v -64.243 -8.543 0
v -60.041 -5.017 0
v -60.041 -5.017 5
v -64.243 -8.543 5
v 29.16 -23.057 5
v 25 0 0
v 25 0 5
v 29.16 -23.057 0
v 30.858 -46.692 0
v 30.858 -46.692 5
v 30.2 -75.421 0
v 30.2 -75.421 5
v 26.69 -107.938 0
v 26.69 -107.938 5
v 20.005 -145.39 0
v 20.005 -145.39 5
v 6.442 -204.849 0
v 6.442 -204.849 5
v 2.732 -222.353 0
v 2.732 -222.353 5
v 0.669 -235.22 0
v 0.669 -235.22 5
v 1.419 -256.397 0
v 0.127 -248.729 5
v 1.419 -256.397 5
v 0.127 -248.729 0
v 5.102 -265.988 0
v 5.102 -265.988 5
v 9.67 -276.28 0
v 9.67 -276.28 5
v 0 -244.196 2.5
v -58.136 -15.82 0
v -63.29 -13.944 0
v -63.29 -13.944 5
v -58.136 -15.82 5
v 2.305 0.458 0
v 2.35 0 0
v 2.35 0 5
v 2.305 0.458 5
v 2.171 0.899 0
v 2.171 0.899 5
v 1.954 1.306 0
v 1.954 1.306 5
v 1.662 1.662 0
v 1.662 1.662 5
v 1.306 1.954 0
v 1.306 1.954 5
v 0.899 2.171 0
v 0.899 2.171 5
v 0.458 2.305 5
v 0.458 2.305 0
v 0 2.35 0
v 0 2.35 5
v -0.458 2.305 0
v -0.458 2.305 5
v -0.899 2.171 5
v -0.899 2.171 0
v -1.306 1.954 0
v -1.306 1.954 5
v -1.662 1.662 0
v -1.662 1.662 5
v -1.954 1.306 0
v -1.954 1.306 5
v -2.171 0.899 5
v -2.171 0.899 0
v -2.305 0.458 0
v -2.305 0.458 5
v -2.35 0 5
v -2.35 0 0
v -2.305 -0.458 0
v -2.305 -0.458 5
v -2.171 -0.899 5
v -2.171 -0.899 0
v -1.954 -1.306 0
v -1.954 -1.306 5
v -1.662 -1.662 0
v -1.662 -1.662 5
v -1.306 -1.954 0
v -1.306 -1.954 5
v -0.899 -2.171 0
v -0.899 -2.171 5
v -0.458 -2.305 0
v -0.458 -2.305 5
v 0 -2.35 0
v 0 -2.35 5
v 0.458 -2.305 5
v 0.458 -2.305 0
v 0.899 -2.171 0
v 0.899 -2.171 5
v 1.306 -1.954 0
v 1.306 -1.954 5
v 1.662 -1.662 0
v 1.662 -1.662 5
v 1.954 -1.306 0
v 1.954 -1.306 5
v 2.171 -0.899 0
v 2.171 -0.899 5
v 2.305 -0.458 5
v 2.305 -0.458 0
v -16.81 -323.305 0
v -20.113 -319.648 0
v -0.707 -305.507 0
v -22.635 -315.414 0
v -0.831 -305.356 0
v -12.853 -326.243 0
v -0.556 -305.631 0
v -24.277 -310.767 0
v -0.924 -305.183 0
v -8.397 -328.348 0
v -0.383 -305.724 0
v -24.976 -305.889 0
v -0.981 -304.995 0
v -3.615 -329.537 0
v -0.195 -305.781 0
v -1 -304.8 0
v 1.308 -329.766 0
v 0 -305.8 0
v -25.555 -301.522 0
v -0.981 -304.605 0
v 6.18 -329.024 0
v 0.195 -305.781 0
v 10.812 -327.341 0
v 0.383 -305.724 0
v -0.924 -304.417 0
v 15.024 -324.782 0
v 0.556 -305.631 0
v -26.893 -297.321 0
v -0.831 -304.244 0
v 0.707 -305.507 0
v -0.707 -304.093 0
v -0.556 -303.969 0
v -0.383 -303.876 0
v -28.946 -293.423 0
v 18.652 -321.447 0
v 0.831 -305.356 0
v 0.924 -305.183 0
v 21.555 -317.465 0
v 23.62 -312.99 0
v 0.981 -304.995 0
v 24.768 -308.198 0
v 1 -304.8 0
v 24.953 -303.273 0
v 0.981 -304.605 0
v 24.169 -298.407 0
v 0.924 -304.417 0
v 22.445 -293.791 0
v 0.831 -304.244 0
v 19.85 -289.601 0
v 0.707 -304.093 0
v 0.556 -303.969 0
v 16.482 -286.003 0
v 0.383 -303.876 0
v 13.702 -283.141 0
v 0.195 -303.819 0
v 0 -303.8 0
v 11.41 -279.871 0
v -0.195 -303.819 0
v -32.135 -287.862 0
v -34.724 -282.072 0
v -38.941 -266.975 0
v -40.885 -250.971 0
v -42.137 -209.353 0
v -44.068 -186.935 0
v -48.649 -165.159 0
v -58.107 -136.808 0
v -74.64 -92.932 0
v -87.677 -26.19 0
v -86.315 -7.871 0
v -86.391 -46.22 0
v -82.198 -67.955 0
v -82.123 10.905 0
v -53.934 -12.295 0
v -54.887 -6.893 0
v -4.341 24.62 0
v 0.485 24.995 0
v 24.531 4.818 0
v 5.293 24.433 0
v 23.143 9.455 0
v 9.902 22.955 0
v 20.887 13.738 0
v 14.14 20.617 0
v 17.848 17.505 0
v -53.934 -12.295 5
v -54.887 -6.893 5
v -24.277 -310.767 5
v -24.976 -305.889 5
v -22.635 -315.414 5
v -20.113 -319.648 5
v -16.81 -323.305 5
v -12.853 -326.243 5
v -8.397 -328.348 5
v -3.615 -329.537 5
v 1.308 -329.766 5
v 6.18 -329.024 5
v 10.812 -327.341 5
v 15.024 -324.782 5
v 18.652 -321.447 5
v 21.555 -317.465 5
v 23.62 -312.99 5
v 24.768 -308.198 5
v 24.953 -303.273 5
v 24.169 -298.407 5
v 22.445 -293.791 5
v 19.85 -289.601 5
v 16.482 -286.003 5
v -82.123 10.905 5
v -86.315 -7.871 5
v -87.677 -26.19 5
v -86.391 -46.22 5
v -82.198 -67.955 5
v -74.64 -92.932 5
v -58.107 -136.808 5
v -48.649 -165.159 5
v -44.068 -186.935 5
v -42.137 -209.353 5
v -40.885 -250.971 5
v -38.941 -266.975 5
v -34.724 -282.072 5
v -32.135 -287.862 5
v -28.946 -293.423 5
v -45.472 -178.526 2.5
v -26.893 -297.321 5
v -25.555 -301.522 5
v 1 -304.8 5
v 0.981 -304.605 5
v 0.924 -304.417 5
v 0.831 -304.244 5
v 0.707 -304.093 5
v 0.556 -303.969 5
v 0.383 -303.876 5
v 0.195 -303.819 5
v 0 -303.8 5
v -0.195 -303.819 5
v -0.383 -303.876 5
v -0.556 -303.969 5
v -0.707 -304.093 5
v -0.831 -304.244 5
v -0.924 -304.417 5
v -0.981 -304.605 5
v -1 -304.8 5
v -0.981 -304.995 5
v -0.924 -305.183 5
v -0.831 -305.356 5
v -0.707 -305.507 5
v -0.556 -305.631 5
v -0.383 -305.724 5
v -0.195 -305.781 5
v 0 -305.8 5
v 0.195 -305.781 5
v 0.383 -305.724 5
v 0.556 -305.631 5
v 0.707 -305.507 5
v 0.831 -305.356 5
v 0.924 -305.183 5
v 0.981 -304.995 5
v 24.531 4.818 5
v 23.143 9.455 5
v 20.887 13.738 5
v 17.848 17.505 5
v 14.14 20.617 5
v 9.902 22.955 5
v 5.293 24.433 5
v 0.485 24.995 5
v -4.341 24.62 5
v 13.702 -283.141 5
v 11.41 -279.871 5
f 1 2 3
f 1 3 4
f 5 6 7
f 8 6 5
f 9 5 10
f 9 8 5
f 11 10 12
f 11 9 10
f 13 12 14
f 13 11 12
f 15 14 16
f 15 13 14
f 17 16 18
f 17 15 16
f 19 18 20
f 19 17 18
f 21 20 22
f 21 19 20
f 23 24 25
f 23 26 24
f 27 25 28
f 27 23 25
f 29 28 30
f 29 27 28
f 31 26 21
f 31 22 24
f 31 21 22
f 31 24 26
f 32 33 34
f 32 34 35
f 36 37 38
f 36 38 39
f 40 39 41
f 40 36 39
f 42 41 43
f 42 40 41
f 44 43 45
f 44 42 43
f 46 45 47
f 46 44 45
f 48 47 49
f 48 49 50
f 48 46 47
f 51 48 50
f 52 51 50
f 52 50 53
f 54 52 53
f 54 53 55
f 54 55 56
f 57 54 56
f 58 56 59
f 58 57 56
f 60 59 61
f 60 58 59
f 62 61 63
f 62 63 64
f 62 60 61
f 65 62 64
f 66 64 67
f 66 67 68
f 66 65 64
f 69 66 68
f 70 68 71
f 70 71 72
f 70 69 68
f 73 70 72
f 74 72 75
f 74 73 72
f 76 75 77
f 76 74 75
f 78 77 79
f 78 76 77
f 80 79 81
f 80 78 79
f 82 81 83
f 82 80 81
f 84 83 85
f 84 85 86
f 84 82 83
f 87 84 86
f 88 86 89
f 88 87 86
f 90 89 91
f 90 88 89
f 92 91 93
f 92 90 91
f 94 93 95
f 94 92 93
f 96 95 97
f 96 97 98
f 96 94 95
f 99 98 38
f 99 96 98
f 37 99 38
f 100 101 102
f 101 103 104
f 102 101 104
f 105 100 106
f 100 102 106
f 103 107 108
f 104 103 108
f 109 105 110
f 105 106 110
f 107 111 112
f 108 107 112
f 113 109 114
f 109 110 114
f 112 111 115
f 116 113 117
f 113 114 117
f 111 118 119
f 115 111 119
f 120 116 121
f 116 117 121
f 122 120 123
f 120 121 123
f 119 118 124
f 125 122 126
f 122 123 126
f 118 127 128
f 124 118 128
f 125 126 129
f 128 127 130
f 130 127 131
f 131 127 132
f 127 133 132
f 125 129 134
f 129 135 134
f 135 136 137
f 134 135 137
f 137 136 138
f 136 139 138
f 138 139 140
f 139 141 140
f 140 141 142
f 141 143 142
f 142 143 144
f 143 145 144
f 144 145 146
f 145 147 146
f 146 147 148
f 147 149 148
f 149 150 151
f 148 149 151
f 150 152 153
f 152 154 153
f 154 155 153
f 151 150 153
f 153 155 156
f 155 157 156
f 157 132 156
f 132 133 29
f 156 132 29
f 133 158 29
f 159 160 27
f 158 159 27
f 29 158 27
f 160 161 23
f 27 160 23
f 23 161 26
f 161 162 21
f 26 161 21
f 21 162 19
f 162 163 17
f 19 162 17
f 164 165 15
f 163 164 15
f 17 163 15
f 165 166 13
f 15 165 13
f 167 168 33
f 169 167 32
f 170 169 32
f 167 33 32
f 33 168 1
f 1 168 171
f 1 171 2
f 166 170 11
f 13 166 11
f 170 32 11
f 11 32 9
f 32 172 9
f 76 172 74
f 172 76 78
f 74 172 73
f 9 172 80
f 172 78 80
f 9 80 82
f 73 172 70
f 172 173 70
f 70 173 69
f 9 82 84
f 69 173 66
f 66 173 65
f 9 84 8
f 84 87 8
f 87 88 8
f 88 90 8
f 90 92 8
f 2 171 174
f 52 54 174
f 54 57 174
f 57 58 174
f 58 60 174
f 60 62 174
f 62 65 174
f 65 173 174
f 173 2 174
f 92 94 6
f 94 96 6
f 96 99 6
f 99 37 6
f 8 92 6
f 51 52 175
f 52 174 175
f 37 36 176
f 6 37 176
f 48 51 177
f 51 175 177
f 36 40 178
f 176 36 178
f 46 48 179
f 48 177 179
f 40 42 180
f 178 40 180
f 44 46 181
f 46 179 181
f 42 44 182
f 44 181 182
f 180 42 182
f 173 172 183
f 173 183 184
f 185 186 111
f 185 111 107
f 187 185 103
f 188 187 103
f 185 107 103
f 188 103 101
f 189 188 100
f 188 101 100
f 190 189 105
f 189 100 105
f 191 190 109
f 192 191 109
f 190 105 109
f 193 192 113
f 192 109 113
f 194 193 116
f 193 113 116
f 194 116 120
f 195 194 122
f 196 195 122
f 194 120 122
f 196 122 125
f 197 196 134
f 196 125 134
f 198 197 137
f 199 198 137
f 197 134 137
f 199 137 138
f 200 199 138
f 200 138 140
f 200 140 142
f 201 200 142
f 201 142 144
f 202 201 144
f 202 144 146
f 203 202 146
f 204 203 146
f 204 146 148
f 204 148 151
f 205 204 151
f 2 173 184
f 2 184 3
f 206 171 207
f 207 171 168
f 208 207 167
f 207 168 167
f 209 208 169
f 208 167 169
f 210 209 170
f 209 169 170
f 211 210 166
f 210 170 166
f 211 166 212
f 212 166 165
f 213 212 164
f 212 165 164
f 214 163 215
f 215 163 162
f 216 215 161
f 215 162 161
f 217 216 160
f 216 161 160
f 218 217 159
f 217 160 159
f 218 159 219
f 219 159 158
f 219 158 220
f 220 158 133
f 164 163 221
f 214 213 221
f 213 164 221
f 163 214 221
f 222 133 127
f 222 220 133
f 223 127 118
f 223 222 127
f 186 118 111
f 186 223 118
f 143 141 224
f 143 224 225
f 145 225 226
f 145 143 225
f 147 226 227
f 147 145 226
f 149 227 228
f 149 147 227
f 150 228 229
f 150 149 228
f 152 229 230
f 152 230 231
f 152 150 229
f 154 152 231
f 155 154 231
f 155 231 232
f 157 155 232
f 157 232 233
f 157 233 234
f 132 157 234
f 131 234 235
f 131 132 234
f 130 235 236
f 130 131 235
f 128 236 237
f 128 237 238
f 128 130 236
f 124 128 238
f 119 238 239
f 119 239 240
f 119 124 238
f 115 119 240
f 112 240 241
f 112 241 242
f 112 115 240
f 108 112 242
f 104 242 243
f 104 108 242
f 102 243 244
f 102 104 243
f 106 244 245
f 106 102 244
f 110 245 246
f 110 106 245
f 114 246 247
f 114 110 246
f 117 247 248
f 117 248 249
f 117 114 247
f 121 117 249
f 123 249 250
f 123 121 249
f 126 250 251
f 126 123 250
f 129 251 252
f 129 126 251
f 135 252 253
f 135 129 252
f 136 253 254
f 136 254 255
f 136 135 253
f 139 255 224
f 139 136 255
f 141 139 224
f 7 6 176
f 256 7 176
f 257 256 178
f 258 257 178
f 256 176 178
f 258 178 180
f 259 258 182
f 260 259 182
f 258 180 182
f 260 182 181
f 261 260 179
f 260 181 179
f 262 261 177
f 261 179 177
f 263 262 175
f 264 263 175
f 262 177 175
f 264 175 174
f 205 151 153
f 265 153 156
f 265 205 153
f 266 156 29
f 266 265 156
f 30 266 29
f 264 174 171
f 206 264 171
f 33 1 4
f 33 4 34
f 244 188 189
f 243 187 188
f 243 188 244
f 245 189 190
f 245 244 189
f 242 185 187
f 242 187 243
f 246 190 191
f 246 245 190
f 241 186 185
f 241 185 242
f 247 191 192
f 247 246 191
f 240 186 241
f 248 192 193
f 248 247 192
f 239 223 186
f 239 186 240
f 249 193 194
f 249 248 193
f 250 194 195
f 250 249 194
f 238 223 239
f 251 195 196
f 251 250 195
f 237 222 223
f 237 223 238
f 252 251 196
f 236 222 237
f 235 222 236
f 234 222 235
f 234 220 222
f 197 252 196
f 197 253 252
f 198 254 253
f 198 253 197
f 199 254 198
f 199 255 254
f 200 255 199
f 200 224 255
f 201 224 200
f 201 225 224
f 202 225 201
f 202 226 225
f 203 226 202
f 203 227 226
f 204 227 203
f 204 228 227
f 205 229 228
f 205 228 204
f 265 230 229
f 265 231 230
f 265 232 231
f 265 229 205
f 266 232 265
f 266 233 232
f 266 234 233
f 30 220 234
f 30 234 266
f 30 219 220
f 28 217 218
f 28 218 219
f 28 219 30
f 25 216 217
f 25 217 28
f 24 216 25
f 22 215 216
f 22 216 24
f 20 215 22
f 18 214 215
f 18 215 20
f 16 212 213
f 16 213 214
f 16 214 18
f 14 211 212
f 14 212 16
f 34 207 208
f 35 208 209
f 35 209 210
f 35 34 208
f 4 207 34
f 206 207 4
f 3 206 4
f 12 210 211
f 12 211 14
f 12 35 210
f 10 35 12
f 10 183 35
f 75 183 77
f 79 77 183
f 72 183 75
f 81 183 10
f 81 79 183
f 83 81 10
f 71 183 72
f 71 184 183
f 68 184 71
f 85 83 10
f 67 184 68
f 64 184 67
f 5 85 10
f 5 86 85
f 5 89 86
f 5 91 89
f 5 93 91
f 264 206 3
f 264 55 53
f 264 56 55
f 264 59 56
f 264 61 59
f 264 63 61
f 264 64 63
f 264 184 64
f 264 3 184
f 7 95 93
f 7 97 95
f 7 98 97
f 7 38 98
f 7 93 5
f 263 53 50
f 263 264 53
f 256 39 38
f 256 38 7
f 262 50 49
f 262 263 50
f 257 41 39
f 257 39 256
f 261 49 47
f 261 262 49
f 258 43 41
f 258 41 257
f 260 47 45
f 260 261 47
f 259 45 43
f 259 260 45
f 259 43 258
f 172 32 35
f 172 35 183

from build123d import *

# Parameters (mm, degrees)
F0_R     = 1
F0_R_2   = 2.35
F2_DEPTH = 5
F3_DEPTH = 5.0010001
F4_R     = 25


with BuildPart() as f2:
    # F0 (on Top) → F2 (new body)
    with BuildSketch(Plane.XY):
        with BuildLine():
            add(Edge.make_bspline(
                [(-82.1230926166, 10.9051483296), (-103.5848878493, -60.0049742057), (-19.3497930189, -169.20375229), (-50.163582636, -268.8476041523), (-24.438918941, -299.5331944222)],
                knots=[0, 0, 0, 0, 0.5562194935, 1, 1, 1, 1], degree=3))
            ThreePointArc((-24.438918941, -299.5331944222), (10.4499069023, -327.5112184995), (11.8990306582, -282.8133433784))
            add(Edge.make_bspline(
                [(25, 0), (47.0782204713, -90.5572716574), (-18.2454262763, -248.1120641616), (7.0555657506, -266.3099283549), (11.8990306582, -282.8133433784)],
                knots=[0, 0, 0, 0, 0.7113740719, 1, 1, 1, 1], degree=3))
            ThreePointArc((25, 0), (16.0696902422, 19.151111078), (-4.3412044417, 24.6201938253))
            Line((-4.3412044417, 24.6201938253), (-82.1230926166, 10.9051483296))
        make_face()
        with Locations((0, -304.8)):
            Circle(F0_R, mode=Mode.SUBTRACT)
        Circle(F0_R_2, mode=Mode.SUBTRACT)
    extrude(amount=F2_DEPTH)

    # F1 (on Top) → F3 (cut, through all)
    with BuildSketch(Plane.XY):
        Polygon((-53.9344131989, -12.2948121673), (-54.886843509, -6.8933114649), (-60.0408954909, -5.0173899577), (-64.2425171626, -8.5429691528), (-63.2900868525, -13.9444698551), (-58.1360348706, -15.8203913624), align=None)
    extrude(amount=F3_DEPTH, mode=Mode.SUBTRACT)

    # F4
    f4_edges = [f2.edges().sort_by_distance(p)[0] for p in [
        (-24.438919, -299.533194, 2.5),
        (11.899031, -282.813343, 2.5),
    ]]
    fillet(f4_edges, radius=F4_R)


solid = f2.part
